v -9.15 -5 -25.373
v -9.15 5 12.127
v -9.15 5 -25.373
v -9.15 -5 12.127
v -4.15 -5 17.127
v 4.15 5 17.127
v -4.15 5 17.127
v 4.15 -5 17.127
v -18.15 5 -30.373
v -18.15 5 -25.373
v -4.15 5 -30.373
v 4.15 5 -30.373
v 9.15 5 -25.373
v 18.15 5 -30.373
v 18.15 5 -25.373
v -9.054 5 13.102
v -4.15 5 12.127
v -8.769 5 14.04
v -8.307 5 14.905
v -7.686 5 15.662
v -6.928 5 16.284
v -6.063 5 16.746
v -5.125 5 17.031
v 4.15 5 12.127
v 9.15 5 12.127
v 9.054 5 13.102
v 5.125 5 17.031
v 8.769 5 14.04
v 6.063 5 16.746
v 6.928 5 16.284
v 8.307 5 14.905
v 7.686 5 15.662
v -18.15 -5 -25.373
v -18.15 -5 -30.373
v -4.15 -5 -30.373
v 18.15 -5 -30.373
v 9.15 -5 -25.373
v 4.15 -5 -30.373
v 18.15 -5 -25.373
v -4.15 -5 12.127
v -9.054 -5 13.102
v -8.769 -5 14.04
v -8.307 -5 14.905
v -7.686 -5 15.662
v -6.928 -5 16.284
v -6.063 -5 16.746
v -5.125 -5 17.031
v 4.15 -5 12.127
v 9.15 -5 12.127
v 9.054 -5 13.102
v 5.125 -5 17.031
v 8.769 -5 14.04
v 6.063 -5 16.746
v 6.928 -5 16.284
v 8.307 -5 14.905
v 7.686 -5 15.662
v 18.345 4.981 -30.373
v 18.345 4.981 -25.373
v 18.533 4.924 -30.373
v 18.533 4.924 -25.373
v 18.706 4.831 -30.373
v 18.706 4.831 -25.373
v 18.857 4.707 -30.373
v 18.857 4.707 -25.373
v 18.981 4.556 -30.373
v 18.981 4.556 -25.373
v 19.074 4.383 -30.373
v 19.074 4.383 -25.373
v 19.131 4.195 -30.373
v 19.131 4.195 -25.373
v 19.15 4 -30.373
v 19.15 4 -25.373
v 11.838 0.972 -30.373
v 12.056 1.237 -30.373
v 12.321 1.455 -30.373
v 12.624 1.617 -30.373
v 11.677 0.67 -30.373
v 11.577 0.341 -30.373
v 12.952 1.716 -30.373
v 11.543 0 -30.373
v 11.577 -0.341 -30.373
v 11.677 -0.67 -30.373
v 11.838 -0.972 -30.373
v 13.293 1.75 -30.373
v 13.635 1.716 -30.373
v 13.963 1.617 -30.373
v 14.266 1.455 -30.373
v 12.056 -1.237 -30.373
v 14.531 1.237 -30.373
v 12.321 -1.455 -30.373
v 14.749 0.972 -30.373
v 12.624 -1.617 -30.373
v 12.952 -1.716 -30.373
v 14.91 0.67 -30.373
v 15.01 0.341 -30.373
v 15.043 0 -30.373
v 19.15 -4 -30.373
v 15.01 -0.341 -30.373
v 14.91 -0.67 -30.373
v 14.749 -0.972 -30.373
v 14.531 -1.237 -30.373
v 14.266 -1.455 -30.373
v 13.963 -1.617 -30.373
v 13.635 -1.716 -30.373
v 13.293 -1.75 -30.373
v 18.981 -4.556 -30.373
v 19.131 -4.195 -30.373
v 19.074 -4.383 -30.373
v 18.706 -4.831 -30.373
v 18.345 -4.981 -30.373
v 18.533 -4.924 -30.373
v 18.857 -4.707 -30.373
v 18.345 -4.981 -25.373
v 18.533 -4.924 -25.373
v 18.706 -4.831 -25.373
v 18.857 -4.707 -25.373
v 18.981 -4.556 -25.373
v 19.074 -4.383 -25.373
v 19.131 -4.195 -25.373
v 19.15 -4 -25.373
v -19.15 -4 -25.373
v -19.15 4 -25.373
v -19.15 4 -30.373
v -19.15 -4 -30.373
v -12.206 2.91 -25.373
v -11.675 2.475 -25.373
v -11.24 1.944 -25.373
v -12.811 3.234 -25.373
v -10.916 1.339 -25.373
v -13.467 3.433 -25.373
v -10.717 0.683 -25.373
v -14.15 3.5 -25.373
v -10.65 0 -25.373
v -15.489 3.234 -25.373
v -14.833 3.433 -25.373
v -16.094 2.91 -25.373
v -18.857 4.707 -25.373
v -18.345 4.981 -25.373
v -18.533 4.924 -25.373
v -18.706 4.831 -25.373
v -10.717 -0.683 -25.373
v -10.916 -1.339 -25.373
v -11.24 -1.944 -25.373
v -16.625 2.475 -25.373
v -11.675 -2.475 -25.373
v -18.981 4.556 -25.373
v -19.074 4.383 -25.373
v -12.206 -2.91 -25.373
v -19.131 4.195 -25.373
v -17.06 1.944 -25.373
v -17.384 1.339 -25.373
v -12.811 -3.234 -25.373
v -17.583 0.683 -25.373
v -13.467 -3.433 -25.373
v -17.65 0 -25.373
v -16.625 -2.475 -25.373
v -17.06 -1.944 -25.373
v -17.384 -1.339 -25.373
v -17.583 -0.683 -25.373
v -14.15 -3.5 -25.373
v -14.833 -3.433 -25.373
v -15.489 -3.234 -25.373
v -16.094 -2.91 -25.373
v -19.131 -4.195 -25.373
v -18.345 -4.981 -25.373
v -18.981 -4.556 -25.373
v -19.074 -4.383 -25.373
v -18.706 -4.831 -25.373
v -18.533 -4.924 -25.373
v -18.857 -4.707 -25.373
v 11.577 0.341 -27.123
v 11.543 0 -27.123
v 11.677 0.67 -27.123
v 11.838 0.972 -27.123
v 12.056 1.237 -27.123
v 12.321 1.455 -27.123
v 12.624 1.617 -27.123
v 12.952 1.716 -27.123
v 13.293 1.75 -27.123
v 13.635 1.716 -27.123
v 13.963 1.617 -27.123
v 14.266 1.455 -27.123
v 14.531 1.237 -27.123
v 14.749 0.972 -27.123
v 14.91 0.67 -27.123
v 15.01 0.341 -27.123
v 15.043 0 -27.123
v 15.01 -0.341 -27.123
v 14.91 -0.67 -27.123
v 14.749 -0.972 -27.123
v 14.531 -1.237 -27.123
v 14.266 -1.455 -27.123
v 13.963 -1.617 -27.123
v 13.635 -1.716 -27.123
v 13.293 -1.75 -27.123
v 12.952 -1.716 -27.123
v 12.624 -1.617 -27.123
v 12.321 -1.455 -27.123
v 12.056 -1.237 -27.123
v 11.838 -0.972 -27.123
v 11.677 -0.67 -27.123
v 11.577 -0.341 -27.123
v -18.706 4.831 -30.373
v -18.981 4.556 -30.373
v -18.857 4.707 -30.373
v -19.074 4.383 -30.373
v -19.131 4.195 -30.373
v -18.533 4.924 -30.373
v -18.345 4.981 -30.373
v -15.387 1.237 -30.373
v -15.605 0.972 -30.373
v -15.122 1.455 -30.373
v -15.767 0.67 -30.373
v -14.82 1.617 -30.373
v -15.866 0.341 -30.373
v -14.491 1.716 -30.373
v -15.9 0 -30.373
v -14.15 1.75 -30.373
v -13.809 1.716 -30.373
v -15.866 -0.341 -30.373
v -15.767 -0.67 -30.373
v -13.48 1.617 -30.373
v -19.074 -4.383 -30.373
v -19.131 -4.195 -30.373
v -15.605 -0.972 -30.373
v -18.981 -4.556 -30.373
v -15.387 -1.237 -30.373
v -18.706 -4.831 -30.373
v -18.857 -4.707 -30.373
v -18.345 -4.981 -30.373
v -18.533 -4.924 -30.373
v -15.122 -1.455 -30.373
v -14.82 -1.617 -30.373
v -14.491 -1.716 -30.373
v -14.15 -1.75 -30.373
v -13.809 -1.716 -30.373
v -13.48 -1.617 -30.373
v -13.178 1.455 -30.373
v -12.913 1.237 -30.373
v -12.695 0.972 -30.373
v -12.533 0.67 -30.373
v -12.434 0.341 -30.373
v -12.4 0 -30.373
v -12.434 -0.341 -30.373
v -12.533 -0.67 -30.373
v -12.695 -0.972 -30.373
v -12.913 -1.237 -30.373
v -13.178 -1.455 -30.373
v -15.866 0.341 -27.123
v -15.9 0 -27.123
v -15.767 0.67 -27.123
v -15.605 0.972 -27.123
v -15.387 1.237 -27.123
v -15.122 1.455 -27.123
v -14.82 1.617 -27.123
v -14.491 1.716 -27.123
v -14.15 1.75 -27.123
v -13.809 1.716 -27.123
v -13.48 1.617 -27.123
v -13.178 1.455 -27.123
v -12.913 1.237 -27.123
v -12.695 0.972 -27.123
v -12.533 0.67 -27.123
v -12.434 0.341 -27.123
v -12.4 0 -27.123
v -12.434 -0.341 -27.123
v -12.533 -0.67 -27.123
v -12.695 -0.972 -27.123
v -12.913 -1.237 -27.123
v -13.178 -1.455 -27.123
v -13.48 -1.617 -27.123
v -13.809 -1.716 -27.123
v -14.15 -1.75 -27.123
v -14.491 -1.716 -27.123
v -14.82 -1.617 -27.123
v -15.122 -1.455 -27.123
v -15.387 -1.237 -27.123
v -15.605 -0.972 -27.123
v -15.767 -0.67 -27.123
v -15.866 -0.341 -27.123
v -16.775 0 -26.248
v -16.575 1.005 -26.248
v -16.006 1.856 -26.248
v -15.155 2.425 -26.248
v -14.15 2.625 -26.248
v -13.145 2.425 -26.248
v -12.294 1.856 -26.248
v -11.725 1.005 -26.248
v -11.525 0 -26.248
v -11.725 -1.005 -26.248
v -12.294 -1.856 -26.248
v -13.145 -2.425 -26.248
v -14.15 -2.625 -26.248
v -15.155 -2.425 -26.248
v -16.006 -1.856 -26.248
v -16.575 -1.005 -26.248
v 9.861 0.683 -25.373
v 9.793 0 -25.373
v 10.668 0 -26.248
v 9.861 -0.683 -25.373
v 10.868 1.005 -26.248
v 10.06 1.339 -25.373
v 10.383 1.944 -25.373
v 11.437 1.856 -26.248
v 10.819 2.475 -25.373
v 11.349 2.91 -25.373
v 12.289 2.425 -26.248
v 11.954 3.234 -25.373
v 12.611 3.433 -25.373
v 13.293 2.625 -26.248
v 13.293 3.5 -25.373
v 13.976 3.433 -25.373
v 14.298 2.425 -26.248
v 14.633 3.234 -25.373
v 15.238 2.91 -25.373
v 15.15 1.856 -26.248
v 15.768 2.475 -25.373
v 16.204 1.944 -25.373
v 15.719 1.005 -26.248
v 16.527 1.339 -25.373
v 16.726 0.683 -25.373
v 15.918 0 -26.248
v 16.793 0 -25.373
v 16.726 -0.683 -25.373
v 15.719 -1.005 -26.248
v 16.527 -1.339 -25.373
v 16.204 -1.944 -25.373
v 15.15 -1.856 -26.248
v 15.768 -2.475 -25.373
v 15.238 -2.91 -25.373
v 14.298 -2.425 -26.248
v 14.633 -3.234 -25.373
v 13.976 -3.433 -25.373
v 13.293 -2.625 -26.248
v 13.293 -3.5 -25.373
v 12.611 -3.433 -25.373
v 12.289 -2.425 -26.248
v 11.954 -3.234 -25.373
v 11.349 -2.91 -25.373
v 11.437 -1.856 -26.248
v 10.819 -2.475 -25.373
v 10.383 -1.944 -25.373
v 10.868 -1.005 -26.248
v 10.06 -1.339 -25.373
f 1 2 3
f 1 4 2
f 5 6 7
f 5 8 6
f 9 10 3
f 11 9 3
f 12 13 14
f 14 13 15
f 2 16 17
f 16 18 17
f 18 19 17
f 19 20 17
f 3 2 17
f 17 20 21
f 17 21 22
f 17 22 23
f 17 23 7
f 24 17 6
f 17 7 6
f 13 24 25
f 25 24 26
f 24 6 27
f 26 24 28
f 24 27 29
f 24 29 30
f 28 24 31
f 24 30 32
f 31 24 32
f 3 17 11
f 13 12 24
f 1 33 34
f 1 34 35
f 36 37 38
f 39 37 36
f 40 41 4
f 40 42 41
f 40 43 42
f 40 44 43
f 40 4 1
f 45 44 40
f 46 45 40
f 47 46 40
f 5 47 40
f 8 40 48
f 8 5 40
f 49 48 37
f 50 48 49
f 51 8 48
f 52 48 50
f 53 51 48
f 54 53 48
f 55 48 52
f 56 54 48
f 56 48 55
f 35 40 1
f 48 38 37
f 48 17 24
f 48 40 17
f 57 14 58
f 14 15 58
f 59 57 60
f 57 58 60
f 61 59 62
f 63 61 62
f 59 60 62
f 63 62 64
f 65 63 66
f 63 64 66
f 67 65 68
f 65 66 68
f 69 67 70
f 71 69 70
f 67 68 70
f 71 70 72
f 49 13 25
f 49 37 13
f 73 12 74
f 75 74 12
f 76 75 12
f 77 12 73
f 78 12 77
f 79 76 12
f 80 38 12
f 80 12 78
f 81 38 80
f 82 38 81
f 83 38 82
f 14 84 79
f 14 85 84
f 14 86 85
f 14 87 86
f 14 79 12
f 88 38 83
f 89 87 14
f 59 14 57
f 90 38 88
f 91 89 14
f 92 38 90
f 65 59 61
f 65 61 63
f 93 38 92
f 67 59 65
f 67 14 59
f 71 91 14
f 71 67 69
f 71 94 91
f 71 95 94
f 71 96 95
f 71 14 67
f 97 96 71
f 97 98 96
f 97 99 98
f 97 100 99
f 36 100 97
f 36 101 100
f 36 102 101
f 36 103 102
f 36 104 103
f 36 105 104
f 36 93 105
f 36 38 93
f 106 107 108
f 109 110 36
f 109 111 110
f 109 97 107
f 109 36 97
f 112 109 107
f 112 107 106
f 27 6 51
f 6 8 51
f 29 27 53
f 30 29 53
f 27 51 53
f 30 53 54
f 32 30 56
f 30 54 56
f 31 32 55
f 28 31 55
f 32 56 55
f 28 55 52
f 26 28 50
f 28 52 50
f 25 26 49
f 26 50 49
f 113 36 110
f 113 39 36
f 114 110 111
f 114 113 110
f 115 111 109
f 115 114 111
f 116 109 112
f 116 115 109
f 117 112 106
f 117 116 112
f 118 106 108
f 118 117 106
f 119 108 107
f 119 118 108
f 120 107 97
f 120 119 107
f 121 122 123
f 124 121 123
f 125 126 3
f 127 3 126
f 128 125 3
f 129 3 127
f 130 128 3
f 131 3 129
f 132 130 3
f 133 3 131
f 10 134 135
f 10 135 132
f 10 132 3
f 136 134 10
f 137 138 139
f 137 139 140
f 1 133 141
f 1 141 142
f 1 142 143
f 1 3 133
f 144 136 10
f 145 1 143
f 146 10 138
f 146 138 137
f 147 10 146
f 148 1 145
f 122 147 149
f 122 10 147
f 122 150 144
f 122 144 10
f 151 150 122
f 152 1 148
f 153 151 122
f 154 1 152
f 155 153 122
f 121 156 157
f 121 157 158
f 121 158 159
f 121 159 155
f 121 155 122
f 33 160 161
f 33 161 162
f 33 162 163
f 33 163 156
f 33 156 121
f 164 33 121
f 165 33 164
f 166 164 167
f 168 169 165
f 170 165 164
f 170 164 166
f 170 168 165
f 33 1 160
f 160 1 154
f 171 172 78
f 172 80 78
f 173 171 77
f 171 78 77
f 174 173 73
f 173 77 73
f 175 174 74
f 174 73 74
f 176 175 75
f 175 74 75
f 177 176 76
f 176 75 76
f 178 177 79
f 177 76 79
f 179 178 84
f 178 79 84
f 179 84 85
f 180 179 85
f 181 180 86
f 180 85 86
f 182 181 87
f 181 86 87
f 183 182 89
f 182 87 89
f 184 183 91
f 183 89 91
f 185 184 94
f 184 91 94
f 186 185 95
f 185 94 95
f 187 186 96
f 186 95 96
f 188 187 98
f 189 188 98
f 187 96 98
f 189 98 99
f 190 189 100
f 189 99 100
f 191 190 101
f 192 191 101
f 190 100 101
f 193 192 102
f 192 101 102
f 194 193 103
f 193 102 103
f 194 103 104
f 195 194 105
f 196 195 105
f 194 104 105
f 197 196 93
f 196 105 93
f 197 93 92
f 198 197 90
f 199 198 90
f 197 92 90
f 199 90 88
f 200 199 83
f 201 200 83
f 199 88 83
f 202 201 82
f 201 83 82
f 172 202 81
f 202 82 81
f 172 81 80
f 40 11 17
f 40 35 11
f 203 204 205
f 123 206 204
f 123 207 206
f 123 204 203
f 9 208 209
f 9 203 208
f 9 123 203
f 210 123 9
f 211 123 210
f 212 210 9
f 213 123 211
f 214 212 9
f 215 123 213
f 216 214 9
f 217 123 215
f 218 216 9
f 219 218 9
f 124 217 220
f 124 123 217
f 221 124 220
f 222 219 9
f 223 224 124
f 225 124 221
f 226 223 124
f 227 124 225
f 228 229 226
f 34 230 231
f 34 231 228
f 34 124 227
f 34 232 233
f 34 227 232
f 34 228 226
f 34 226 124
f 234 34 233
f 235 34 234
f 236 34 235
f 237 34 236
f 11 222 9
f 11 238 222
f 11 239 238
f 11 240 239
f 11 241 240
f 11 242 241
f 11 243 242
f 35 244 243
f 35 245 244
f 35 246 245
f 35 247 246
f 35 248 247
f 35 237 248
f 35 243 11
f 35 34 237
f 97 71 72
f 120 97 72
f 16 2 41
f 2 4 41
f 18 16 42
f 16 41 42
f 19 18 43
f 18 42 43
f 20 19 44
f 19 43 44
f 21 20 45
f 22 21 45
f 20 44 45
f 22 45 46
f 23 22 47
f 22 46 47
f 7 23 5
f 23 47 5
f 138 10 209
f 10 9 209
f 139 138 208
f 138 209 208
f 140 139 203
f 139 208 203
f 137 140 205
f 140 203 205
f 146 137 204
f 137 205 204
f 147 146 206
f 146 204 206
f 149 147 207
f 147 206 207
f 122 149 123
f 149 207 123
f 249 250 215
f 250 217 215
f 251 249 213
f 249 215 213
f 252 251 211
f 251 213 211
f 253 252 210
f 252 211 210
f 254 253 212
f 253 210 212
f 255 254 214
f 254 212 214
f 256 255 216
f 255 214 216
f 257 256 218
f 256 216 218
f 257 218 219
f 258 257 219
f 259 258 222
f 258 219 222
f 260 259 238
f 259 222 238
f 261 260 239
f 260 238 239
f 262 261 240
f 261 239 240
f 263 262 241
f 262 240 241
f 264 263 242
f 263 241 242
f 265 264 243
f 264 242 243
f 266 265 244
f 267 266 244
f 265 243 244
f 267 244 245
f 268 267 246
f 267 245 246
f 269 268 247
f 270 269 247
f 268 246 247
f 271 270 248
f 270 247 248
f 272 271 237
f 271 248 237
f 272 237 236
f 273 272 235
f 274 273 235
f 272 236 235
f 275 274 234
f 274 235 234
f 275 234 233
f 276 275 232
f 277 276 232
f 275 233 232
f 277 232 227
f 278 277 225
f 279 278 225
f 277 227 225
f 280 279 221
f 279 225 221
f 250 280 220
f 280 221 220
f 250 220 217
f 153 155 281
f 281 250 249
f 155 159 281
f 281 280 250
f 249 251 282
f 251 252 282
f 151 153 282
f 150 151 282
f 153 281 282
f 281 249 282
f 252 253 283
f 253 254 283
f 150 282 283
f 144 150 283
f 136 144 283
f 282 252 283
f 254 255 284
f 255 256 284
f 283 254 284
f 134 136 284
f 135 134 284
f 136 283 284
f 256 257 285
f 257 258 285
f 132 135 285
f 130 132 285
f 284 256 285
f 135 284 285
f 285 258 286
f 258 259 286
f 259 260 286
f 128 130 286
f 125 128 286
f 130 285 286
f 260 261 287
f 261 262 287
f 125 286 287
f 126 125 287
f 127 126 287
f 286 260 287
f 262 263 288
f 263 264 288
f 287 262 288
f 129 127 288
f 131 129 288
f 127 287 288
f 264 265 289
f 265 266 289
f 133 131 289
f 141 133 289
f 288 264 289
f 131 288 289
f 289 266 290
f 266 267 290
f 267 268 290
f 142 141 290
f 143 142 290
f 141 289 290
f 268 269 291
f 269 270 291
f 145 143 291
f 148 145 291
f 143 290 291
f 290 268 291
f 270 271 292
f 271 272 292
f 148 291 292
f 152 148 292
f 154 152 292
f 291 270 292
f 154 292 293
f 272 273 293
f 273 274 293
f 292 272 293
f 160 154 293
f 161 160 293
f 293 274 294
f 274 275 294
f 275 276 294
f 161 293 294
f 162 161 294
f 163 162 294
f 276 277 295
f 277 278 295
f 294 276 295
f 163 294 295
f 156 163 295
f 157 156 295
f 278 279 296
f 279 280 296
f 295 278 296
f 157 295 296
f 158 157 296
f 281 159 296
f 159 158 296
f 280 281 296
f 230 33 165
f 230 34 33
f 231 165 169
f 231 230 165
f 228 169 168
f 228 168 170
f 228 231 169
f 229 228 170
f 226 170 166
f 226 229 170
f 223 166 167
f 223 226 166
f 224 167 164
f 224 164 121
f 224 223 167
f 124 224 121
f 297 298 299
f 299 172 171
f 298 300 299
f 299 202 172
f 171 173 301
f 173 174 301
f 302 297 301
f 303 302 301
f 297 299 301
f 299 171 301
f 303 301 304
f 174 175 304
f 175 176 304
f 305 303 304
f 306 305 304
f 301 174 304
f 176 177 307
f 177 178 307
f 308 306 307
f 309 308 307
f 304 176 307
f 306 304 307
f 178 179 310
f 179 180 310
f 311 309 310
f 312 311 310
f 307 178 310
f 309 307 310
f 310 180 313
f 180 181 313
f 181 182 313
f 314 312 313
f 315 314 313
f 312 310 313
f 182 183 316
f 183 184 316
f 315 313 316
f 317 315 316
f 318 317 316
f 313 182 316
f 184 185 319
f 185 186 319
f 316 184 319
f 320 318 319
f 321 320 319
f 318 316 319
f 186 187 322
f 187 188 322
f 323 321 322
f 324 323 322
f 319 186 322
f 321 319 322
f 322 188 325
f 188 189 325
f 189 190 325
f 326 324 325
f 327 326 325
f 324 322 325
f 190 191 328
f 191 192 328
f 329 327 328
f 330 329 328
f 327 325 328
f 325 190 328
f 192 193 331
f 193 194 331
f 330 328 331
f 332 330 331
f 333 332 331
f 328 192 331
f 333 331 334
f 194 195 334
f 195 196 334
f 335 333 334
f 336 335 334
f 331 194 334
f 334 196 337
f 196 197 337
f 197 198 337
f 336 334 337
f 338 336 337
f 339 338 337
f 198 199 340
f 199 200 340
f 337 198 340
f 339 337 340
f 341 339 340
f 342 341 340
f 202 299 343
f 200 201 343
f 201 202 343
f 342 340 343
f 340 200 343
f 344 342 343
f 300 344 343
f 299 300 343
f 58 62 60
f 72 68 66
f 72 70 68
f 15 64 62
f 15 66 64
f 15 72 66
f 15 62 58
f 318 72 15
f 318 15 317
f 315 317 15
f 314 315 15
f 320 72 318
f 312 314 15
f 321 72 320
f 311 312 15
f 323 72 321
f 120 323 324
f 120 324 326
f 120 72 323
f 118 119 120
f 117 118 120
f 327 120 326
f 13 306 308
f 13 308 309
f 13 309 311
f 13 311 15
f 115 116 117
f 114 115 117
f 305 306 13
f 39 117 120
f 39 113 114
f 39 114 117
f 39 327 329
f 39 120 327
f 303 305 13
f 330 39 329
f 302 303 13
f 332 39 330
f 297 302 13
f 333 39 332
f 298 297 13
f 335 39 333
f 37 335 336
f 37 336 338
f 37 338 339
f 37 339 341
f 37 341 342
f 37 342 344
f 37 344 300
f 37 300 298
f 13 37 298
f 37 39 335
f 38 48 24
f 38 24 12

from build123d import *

# Parameters (mm, degrees)
F1_DEPTH       = 5
F3_D           = 3.5
F3_CSINK_D     = 7
F3_CSINK_ANGLE = 90
F4_D           = 3.5
F4_CSINK_D     = 7
F4_CSINK_ANGLE = 90
F5_R           = 5
F6_R           = 1


with BuildPart() as f1:
    # F0 (on Front) → F1 (new body, symmetric)
    with BuildSketch(Plane.XZ):
        Polygon((-4.15, 12.126713), (0, 12.126713), (4.15, 12.126713), (4.15, -30.373287), (19.15, -30.373287), (19.15, -25.373287), (9.15, -25.373287), (9.15, 17.126713), (0, 17.126713), (-9.15, 17.126713), (-9.15, -25.373287), (-19.15, -25.373287), (-19.15, -30.373287), (-4.15, -30.373287), align=None)
    extrude(amount=F1_DEPTH, both=True)

    # F3 (through all)
    with Locations(Plane.XY.offset(-25.373287)):
        with Locations((13.293465, 0)):
            CounterSinkHole(F3_D / 2, F3_CSINK_D / 2, counter_sink_angle=F3_CSINK_ANGLE)

    # F4 (through all)
    with Locations(Plane.XY.offset(-25.373287)):
        with Locations((-14.15, 0)):
            CounterSinkHole(F4_D / 2, F4_CSINK_D / 2, counter_sink_angle=F4_CSINK_ANGLE)

    # F5
    f5_edges = [f1.edges().sort_by_distance(p)[0] for p in [
        (-9.15, 0, 17.126713),
        (9.15, 0, 17.126713),
    ]]
    fillet(f5_edges, radius=F5_R)

    # F6
    f6_edges = [f1.edges().sort_by_distance(p)[0] for p in [
        (19.15, 5, -27.873287),
        (19.15, -5, -27.873287),
        (-19.15, -5, -27.873287),
        (-19.15, 5, -27.873287),
    ]]
    fillet(f6_edges, radius=F6_R)


solid = f1.part
